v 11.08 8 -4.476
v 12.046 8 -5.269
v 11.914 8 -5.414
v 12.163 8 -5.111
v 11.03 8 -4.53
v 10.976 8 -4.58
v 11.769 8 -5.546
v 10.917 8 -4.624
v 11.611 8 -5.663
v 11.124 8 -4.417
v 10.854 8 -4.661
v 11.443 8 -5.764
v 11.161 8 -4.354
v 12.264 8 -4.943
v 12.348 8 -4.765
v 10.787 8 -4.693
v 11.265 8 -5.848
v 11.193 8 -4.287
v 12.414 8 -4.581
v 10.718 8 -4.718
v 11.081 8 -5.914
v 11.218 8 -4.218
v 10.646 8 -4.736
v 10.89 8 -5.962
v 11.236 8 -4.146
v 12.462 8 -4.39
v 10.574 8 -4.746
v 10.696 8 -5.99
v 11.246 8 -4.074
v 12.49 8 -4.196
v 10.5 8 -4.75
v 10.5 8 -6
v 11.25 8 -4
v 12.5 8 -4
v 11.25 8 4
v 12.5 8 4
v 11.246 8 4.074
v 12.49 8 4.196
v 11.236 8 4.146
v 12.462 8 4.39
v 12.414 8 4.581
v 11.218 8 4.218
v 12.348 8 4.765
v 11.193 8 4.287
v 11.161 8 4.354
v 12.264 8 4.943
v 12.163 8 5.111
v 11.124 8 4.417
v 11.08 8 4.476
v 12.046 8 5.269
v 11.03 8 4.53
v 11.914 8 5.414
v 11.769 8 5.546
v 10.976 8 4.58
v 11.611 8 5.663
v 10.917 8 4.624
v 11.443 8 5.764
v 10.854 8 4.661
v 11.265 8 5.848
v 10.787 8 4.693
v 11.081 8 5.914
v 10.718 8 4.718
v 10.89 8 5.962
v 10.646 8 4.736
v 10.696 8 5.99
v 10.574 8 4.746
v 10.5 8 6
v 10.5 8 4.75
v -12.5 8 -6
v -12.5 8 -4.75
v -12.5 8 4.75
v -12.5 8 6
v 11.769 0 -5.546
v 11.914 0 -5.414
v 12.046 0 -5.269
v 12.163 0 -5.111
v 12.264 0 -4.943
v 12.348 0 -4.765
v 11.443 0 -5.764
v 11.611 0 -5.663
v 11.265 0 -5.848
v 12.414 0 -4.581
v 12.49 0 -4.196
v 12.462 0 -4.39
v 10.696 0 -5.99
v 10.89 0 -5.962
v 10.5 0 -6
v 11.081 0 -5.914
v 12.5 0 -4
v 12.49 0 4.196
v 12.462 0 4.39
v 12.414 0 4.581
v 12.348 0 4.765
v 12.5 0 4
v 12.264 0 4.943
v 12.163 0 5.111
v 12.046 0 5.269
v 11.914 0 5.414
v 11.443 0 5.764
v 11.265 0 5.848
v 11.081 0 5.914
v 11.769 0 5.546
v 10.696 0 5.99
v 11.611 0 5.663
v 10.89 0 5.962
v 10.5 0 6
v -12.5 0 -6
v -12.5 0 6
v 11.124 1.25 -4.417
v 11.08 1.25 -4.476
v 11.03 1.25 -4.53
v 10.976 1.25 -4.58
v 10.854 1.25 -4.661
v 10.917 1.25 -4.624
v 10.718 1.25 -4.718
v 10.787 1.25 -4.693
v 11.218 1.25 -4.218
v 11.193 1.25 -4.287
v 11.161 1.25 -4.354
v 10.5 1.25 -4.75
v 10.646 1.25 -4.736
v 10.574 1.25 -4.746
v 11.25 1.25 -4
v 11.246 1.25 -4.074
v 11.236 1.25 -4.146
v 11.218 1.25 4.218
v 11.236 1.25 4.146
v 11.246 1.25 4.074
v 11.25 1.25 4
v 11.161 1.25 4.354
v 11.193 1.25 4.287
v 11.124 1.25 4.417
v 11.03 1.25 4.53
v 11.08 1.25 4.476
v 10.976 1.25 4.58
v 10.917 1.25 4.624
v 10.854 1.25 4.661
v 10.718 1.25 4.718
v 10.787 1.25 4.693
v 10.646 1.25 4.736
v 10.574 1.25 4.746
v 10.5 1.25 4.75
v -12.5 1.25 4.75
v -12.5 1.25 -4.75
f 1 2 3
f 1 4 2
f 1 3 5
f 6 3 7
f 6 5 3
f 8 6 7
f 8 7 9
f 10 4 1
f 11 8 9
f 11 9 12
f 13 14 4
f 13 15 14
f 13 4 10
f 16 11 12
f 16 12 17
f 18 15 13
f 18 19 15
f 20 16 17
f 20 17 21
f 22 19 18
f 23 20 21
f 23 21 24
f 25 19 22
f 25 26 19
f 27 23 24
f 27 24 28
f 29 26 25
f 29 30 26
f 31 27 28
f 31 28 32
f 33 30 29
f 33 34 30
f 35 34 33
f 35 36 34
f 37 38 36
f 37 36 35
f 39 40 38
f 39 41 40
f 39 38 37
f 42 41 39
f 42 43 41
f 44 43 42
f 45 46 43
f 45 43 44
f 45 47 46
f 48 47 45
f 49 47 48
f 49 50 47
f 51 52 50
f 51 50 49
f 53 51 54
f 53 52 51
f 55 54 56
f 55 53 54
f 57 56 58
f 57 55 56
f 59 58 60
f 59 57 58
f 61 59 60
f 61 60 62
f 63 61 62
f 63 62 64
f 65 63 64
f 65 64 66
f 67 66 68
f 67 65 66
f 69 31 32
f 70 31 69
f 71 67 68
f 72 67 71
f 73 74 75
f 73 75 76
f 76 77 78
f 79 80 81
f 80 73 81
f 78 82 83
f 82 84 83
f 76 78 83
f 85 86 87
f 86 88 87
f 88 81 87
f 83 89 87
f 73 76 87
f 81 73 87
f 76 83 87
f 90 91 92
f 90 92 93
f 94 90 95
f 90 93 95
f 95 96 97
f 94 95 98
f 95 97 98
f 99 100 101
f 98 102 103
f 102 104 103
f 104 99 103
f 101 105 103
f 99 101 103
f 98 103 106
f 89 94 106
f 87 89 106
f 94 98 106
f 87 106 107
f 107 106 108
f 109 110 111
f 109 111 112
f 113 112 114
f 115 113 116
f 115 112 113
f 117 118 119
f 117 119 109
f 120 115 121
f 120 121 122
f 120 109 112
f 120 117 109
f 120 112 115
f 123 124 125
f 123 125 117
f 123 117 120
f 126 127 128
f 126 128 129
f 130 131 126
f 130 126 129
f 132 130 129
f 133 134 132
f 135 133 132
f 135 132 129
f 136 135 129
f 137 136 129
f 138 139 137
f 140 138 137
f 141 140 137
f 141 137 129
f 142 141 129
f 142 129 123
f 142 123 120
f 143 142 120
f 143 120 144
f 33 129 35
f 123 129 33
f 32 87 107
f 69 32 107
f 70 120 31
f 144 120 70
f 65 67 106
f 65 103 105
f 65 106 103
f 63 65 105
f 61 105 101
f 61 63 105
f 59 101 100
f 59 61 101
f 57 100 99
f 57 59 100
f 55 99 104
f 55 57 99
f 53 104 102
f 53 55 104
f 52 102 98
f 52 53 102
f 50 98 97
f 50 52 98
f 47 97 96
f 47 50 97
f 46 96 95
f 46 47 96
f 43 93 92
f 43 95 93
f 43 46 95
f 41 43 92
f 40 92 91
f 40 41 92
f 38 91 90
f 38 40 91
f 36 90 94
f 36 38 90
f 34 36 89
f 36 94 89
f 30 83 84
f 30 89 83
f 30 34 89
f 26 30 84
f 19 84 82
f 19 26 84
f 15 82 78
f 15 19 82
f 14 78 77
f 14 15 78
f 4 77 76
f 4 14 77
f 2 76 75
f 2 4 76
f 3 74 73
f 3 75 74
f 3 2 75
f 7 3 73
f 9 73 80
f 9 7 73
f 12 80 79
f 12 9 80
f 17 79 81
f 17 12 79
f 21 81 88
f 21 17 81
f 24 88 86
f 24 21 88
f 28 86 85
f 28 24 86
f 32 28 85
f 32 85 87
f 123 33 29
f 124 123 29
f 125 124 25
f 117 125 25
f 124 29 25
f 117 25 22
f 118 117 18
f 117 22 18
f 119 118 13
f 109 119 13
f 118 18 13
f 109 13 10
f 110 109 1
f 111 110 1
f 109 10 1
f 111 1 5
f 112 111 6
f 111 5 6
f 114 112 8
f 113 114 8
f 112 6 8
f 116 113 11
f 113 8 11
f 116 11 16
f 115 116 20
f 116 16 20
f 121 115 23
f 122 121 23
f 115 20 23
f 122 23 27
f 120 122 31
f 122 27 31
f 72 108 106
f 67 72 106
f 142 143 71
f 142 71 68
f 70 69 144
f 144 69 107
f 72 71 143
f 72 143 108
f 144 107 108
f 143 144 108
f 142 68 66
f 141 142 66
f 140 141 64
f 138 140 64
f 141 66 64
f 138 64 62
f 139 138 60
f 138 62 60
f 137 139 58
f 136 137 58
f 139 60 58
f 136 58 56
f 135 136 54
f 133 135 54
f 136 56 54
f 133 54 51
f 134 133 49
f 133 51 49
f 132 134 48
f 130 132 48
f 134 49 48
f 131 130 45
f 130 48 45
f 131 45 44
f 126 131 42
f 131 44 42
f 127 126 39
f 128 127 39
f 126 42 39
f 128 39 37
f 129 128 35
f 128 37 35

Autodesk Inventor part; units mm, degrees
ref_plane "YZ Plane" through (0, 0, 0) normal (1, 0, 0) x (0, 1, 0)
ref_plane "XZ Plane" through (0, 0, 0) normal (0, 1, 0) x (-1, 0, 0)
ref_plane "XY Plane" through (0, 0, 0) normal (0, 0, 1) x (1, 0, 0)
sketch "Skizze1" plane through (0, 0, 0) normal (0, 1, 0) x (-1, 0, 0)
  line L0 (12.5, 6) -> (-12.5, 6)
  line L1 (-12.5, 6) -> (-12.5, -6)
  line L2 (-12.5, -6) -> (12.5, -6)
  line L3 (12.5, -6) -> (12.5, 6)
  line L4 (12.5, 6) -> (-12.5, -6) construction
  line L5 (-12.5, 6) -> (12.5, -6) construction
  point P0 (0, 0)
  dimension "d0" = 12
  dimension "d2" = 25
extrude "Extrusion1" add sketch "Skizze1" along normal blind 8
fillet "Rundung1" radius 2 2 edges at (12.5, 4, 6) (12.5, 4, -6)
shell "Wandung1" thickness 1.25 removed faces 2 at (-12.5, 2.6667, -2) at (2.8333, 8, -2)
properties part number "P_Case"
